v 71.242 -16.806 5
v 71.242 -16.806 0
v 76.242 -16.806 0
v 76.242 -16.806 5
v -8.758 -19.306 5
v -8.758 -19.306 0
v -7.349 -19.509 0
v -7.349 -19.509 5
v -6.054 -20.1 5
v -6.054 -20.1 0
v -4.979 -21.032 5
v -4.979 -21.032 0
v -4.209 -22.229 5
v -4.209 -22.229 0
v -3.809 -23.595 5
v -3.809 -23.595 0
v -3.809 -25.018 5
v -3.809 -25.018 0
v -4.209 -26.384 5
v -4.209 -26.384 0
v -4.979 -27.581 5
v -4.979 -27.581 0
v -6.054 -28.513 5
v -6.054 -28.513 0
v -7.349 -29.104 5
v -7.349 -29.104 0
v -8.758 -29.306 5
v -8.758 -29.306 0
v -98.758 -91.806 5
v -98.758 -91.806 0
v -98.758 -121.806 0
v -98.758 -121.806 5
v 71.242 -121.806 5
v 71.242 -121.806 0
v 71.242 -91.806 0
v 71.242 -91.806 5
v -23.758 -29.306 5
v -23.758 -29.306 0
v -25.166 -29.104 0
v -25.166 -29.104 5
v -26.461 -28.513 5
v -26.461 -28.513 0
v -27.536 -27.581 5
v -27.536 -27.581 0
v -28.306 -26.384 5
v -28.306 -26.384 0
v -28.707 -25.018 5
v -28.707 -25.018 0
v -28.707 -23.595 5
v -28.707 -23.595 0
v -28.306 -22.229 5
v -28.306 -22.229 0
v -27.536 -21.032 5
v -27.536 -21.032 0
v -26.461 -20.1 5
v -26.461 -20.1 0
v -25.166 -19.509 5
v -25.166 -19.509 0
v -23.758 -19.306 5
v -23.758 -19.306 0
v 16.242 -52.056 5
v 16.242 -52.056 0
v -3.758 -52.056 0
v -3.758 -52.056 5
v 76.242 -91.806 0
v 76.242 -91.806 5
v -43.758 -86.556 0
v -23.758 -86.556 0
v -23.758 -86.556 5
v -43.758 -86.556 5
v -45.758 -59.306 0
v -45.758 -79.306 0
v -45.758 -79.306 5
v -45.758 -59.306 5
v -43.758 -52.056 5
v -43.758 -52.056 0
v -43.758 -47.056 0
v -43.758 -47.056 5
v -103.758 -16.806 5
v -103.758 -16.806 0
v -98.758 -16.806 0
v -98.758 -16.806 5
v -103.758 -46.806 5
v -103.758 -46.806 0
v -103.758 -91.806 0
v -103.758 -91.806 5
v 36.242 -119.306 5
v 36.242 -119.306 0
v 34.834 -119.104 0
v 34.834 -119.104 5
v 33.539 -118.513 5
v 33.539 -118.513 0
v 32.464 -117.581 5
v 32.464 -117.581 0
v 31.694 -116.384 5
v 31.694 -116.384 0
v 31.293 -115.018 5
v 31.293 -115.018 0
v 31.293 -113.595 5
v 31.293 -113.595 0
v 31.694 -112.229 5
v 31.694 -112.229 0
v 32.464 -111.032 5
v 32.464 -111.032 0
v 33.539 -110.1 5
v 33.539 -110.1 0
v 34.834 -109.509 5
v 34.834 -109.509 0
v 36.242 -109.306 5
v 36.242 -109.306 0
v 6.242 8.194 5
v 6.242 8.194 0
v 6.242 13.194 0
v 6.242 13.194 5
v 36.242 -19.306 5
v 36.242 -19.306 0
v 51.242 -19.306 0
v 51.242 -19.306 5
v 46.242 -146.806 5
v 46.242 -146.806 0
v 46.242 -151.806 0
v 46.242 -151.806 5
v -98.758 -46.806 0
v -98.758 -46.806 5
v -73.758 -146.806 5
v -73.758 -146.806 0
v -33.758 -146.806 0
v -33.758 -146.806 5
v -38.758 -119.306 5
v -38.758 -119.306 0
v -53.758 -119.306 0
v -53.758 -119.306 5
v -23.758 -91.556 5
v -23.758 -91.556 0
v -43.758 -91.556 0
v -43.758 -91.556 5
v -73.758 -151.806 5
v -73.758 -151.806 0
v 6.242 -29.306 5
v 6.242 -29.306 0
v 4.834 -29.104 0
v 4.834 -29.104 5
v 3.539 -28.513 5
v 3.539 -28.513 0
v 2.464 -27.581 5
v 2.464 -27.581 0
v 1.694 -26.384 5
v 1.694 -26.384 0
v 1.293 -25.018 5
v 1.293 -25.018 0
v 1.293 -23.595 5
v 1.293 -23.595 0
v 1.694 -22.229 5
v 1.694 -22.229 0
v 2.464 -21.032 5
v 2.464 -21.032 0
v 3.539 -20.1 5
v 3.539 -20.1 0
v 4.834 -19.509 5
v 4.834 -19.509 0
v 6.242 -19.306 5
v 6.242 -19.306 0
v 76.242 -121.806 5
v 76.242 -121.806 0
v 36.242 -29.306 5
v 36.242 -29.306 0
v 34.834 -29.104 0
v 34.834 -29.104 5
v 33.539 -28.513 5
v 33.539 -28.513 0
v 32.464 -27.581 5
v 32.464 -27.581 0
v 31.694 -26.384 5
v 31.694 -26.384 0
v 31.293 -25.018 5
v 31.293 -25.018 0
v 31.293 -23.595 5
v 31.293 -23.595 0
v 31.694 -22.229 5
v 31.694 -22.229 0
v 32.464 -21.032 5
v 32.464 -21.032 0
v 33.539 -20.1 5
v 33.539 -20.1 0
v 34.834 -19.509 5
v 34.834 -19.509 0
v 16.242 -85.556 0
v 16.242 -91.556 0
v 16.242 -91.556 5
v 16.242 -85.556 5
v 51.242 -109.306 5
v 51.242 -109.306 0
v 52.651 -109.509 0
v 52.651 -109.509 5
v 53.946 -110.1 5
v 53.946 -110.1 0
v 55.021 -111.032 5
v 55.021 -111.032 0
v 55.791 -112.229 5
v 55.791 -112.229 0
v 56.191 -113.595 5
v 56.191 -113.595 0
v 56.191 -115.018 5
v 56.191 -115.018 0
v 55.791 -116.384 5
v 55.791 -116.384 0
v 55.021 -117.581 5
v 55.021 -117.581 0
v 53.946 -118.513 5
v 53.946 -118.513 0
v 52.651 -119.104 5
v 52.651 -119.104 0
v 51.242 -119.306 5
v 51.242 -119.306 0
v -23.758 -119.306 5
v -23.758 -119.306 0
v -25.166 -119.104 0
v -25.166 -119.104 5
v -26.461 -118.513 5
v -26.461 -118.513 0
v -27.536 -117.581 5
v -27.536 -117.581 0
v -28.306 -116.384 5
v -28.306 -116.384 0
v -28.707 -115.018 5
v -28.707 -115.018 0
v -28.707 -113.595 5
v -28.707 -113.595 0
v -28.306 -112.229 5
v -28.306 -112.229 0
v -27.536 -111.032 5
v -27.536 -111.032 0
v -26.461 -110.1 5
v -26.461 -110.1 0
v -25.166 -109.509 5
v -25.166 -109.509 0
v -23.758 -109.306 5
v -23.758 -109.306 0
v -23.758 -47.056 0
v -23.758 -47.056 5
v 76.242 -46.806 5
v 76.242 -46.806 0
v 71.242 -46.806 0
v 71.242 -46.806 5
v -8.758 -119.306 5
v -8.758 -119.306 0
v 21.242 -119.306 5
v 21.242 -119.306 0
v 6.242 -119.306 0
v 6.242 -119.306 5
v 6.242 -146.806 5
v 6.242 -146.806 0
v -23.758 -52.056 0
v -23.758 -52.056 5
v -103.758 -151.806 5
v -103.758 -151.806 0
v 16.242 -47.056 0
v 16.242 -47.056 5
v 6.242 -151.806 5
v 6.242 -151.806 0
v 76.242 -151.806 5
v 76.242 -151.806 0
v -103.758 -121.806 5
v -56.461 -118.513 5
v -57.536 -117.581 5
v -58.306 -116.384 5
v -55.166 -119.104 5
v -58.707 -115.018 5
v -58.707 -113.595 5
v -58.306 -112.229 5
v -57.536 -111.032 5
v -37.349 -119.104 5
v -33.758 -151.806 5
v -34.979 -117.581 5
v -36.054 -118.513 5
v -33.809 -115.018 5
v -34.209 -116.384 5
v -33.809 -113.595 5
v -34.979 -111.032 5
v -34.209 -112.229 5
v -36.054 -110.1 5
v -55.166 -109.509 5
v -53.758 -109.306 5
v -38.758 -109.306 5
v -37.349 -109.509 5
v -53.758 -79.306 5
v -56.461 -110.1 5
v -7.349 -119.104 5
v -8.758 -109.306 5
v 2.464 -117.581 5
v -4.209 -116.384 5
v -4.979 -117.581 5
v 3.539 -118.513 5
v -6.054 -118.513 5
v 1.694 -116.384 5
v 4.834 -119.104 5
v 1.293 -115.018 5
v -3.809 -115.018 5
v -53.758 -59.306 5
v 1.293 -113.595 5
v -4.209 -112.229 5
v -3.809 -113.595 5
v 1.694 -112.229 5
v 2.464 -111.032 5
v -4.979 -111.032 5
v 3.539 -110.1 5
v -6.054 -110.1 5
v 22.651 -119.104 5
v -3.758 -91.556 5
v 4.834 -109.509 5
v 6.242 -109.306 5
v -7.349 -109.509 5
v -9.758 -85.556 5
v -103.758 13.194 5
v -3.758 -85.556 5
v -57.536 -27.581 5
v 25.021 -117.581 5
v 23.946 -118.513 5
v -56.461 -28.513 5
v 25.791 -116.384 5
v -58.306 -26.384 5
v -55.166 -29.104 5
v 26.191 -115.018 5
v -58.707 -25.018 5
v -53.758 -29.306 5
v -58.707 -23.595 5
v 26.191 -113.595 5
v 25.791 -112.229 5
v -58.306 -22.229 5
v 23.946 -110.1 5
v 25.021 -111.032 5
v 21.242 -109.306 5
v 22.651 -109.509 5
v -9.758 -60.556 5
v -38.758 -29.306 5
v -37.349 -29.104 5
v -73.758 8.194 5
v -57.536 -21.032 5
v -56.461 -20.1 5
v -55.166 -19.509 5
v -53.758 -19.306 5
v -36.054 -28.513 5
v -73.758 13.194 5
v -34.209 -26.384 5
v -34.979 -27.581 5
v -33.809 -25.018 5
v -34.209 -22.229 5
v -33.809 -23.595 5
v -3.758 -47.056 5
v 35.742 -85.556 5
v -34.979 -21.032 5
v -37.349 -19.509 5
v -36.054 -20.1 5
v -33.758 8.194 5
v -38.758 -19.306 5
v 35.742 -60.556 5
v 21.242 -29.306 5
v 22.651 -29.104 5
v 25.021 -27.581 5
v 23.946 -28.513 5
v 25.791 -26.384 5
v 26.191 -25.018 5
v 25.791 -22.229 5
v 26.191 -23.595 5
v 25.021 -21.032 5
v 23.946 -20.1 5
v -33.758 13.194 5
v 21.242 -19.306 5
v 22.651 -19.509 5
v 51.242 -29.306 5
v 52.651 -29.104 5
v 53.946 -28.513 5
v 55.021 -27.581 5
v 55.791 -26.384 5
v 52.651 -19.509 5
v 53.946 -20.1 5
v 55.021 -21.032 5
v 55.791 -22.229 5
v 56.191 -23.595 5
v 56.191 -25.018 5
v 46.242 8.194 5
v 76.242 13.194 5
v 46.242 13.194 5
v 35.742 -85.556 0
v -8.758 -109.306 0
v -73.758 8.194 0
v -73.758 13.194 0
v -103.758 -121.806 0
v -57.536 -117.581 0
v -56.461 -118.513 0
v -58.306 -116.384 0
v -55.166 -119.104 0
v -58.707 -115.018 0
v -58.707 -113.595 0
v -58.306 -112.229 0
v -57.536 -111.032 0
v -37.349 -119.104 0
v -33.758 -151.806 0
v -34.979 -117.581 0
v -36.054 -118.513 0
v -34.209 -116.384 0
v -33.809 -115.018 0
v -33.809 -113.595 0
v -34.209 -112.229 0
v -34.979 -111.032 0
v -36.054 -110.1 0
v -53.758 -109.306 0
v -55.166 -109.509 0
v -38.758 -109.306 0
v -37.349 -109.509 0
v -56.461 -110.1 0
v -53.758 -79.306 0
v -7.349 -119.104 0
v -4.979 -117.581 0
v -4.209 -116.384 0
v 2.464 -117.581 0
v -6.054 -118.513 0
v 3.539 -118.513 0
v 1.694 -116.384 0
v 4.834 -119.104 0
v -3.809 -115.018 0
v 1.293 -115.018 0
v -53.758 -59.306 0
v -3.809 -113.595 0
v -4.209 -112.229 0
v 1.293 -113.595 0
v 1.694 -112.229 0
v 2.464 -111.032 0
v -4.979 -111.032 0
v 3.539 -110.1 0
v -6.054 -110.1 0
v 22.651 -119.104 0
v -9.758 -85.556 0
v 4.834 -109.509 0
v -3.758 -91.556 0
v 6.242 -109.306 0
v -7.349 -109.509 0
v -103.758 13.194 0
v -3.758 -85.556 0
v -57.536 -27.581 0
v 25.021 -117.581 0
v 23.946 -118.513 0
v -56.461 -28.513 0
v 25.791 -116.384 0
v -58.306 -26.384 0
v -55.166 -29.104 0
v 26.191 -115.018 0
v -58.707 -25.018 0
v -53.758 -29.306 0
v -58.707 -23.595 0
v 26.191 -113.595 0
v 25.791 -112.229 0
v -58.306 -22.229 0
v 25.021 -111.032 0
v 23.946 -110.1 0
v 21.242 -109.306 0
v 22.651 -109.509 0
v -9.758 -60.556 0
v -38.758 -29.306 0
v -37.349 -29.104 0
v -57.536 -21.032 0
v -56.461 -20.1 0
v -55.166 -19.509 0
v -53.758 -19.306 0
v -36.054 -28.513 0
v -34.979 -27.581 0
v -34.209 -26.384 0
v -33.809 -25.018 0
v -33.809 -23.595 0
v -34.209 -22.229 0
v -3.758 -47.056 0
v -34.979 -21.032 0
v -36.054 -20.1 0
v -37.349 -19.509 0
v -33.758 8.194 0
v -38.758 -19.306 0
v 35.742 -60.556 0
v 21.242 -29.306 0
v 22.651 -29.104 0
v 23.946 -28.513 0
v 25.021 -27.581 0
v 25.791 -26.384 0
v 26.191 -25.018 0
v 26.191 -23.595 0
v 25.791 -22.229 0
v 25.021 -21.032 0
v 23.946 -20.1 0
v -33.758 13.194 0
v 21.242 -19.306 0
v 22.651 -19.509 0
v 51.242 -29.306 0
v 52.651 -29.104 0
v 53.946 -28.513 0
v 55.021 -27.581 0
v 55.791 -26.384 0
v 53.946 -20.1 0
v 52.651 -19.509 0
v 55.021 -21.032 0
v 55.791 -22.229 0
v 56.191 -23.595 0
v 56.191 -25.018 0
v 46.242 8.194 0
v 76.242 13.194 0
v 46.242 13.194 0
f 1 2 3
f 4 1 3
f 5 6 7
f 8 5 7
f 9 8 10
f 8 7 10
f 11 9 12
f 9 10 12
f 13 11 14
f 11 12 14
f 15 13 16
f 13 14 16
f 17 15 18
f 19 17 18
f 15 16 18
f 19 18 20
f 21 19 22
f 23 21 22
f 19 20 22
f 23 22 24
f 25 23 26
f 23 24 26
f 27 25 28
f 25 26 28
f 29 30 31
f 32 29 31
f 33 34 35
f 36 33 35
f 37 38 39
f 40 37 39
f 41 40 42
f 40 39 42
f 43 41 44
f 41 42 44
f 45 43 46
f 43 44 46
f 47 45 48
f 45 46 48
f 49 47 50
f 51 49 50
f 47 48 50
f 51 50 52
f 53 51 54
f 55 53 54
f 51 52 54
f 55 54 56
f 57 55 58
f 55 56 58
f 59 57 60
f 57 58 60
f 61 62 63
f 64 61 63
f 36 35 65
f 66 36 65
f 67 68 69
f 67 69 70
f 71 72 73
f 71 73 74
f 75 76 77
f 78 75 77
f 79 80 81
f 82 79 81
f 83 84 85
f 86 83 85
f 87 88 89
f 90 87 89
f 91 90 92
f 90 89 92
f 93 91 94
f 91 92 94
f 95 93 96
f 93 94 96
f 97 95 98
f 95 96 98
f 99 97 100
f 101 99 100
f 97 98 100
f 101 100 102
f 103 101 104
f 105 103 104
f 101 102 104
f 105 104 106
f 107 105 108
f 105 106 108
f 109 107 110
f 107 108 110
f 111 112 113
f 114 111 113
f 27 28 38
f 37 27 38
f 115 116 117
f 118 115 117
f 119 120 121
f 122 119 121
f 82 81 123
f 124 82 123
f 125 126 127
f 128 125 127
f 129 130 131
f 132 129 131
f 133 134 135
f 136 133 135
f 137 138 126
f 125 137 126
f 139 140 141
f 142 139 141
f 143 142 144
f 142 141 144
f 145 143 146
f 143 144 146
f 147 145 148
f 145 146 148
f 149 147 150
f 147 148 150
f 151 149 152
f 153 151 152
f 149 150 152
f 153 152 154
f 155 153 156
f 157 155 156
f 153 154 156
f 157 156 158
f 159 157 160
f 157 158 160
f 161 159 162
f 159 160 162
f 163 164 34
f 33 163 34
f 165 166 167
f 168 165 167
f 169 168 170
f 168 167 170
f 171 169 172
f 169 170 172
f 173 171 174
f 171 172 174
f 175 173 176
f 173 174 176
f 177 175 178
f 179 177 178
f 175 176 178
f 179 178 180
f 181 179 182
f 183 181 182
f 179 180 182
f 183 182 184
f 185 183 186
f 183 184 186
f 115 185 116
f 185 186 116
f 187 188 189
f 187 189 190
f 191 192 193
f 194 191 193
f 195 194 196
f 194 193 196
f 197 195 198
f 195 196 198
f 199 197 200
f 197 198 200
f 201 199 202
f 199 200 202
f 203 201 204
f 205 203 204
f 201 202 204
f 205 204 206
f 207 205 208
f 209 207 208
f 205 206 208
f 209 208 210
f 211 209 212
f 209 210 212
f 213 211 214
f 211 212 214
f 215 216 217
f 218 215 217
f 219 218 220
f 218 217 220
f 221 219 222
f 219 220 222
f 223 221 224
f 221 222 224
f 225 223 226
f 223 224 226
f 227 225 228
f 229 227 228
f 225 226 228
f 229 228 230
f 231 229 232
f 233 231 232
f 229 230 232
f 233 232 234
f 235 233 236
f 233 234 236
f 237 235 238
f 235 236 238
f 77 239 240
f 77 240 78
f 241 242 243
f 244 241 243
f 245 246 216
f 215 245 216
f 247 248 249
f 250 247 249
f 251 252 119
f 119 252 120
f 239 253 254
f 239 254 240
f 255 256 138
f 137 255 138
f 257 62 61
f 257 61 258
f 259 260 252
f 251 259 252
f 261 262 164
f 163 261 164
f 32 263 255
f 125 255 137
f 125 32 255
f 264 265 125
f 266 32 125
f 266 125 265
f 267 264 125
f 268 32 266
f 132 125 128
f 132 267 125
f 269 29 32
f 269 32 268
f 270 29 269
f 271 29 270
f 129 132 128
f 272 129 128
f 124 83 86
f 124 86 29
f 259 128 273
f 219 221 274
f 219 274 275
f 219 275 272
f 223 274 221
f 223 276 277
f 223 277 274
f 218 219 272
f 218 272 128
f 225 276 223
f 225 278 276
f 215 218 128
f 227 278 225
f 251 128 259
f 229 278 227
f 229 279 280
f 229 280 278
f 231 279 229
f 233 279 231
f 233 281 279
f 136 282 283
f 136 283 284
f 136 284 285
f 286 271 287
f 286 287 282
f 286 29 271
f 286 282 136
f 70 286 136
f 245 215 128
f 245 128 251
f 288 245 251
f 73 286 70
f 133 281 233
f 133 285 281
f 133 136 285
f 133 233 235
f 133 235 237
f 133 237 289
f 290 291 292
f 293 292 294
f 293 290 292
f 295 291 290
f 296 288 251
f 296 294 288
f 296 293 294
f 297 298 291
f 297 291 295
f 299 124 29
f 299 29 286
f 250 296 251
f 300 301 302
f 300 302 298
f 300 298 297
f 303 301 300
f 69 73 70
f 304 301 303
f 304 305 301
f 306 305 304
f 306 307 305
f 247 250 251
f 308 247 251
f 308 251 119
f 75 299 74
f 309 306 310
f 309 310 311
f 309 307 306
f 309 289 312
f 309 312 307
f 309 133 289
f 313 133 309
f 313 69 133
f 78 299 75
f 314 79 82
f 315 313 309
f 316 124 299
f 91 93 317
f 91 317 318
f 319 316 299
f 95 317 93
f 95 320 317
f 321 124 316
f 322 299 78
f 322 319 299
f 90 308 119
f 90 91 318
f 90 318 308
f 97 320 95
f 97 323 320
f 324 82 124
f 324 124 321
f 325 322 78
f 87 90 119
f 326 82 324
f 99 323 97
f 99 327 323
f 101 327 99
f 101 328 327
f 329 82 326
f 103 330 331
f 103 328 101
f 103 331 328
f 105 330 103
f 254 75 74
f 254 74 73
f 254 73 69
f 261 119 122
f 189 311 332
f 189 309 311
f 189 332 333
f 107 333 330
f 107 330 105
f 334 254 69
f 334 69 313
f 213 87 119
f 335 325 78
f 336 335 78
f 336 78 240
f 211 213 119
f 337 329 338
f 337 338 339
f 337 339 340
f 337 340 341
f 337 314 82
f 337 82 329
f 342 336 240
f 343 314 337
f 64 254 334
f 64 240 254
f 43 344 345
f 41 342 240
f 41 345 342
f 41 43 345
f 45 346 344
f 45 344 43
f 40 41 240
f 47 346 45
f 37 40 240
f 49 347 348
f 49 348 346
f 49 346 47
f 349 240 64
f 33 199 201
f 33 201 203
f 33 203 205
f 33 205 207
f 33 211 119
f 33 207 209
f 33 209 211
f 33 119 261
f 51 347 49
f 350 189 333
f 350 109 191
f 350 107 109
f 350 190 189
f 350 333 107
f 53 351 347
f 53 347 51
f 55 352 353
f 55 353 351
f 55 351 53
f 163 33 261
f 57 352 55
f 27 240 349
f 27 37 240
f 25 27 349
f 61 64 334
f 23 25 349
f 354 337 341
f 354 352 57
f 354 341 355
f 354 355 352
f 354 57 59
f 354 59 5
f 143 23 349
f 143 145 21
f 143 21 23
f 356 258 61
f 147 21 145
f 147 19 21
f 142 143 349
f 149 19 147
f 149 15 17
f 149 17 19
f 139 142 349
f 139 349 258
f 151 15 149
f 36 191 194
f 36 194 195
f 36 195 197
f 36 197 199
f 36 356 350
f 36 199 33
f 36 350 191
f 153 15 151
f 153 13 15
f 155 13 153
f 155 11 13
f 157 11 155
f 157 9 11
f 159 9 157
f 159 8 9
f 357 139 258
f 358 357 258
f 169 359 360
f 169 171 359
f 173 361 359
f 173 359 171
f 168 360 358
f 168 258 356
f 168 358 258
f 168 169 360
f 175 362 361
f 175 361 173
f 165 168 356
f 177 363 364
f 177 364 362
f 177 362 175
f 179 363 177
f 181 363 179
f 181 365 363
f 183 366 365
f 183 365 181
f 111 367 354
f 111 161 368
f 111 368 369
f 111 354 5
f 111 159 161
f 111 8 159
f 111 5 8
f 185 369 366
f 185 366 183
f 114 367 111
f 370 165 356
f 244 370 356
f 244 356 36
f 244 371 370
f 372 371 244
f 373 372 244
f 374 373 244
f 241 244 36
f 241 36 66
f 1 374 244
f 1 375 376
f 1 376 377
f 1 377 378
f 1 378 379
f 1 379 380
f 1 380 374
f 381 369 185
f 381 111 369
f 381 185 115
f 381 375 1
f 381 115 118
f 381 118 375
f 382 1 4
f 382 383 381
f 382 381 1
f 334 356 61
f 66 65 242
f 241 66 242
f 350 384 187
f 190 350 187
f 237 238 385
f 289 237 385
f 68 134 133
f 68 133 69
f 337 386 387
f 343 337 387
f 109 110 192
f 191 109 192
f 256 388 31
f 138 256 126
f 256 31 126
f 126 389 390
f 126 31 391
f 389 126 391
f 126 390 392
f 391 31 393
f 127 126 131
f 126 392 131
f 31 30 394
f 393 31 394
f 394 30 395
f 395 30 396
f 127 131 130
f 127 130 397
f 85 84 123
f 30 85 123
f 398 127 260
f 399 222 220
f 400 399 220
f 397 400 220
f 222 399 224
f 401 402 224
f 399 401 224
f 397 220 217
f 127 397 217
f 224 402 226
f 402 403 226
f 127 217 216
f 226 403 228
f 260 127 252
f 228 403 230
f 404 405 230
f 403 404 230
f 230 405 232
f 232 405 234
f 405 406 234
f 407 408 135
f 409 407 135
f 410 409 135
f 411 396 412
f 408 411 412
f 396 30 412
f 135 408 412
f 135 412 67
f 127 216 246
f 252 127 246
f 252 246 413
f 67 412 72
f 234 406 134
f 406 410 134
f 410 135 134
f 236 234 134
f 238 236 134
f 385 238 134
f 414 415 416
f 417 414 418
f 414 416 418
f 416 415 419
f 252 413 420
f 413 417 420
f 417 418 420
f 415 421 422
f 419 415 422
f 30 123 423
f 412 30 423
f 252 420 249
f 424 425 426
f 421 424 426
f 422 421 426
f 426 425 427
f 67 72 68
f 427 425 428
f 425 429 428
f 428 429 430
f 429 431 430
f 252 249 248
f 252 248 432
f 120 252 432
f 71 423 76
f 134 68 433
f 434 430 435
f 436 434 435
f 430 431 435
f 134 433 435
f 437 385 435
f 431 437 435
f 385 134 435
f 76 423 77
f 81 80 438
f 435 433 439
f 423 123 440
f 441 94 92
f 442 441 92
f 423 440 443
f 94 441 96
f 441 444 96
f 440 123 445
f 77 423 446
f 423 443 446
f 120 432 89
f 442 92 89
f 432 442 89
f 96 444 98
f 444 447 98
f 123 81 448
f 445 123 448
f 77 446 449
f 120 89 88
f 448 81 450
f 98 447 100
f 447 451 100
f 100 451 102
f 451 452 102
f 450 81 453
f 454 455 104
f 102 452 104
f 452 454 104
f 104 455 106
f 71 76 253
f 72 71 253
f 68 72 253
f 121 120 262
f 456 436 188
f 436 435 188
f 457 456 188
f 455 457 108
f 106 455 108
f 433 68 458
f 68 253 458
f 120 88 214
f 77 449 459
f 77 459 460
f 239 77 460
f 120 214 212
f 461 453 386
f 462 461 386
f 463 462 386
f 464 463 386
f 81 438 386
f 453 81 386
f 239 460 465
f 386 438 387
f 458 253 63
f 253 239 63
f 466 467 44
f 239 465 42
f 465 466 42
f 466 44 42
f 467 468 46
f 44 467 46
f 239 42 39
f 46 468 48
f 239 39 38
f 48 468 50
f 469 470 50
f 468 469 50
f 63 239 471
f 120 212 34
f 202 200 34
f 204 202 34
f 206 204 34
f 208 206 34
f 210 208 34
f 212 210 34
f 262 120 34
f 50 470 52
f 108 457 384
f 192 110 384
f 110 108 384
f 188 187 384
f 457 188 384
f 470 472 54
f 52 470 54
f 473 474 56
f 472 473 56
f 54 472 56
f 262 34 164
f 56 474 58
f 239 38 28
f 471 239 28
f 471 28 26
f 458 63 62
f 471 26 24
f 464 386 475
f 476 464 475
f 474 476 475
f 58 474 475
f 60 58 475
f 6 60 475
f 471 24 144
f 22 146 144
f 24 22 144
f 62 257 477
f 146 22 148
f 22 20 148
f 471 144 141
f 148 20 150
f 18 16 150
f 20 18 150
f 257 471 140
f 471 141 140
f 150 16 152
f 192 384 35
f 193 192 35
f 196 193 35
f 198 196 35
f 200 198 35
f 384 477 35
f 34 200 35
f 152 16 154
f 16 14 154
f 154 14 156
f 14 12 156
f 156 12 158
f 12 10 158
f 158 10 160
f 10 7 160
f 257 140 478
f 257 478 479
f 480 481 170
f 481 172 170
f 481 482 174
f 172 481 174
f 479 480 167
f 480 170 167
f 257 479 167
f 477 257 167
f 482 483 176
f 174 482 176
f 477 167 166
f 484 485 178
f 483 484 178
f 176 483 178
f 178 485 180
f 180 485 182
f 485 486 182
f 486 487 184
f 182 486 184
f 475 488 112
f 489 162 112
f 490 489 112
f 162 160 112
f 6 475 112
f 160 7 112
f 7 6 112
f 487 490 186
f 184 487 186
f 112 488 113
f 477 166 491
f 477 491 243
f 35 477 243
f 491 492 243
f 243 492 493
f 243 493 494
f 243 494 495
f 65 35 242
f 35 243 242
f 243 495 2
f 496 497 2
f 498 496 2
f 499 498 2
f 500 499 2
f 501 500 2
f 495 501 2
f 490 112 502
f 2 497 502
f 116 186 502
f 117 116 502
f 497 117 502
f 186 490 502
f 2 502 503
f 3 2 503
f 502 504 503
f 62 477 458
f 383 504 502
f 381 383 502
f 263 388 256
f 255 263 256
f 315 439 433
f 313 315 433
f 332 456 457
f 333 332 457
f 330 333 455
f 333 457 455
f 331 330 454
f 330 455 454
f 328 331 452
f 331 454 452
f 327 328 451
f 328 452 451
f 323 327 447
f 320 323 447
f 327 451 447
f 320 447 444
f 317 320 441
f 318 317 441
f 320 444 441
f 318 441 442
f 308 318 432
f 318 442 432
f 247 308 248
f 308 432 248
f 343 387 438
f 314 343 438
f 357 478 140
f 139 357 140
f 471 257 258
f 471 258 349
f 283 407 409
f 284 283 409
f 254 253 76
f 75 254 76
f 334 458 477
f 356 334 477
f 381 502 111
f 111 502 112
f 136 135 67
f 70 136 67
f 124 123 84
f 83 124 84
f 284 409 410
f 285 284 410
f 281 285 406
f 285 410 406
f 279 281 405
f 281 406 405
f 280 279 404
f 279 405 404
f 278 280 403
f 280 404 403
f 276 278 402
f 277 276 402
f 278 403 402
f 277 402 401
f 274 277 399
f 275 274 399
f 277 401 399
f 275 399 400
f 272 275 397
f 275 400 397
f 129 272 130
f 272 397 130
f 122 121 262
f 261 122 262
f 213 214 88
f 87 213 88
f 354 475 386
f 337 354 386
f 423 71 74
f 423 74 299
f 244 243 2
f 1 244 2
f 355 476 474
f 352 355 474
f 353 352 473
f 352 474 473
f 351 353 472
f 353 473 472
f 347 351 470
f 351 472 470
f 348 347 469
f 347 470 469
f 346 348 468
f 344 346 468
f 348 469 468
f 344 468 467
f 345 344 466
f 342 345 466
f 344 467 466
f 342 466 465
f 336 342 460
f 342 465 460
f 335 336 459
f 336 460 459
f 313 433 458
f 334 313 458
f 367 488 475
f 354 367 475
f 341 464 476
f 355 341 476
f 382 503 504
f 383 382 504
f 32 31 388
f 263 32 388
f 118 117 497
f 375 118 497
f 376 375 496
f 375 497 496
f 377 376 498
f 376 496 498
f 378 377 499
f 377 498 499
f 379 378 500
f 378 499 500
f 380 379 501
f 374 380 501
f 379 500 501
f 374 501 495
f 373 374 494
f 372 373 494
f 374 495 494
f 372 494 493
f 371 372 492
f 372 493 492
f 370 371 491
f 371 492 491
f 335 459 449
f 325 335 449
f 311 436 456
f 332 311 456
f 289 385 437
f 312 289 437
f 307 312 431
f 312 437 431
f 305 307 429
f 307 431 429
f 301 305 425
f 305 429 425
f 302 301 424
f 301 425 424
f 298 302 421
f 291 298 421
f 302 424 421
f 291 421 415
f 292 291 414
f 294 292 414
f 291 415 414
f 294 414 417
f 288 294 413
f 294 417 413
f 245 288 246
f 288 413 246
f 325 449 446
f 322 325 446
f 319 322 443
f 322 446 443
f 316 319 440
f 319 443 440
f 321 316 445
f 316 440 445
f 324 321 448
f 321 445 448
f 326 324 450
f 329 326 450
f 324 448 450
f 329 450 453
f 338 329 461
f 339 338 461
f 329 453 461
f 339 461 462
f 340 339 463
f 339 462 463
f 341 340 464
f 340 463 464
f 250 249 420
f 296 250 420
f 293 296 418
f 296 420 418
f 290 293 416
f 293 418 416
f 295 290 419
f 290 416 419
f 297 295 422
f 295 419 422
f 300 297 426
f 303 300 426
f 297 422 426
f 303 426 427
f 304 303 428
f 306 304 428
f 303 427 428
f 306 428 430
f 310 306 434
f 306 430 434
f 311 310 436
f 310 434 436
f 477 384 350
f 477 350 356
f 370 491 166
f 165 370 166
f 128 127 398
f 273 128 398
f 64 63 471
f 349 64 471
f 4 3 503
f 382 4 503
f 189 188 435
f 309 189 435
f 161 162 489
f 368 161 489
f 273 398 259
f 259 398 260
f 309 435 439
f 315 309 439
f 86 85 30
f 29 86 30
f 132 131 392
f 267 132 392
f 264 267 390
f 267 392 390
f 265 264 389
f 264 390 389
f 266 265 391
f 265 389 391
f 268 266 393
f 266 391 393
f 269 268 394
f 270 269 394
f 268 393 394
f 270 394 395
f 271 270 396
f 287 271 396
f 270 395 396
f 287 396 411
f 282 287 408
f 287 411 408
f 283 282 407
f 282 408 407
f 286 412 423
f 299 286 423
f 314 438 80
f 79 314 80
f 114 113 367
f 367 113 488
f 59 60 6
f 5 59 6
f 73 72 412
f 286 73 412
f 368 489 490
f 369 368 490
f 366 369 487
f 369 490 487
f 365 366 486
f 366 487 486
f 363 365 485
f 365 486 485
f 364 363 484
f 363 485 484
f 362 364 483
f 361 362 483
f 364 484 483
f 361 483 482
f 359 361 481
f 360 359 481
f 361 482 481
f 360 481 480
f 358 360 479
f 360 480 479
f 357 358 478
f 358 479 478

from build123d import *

# Parameters (mm, degrees)
BOSS_EXTRUDE1_DEPTH = 5
SKETCH2_W           = 20
SKETCH2_H           = 5
SKETCH2_H_2         = 6
SKETCH2_W_2         = 8
SKETCH2_H_3         = 20
SKETCH2_W_3         = 11.5
SKETCH2_H_4         = 25
SKETCH2_W_4         = 3
CUT_EXTRUDE1_DEPTH  = 10


with BuildPart() as part:
    # Sketch1 → Boss-Extrude1 (new body)
    with BuildSketch(Plane.XY):
        Polygon((6.242353031, 8.193551366), (6.242353031, 13.193551366), (-33.757646969, 13.193551366), (-33.757646969, 8.193551366), (-73.757646969, 8.193551366), (-73.757646969, 13.193551366), (-103.757646969, 13.193551366), (-103.757646969, -16.806448634), (-98.757646969, -16.806448634), (-98.757646969, -46.806448634), (-103.757646969, -46.806448634), (-103.757646969, -91.806448634), (-98.757646969, -91.806448634), (-98.757646969, -121.806448634), (-103.757646969, -121.806448634), (-103.757646969, -151.806448634), (-73.757646969, -151.806448634), (-73.757646969, -146.806448634), (-33.757646969, -146.806448634), (-33.757646969, -151.806448634), (6.242353031, -151.806448634), (6.242353031, -146.806448634), (46.242353031, -146.806448634), (46.242353031, -151.806448634), (76.242353031, -151.806448634), (76.242353031, -121.806448634), (71.242353031, -121.806448634), (71.242353031, -91.806448634), (76.242353031, -91.806448634), (76.242353031, -46.806448634), (71.242353031, -46.806448634), (71.242353031, -16.806448634), (76.242353031, -16.806448634), (76.242353031, 13.193551366), (46.242353031, 13.193551366), (46.242353031, 8.193551366), align=None)
        with BuildLine():
            ThreePointArc((21.242353031, -19.306448634), (26.242353031, -24.306448634), (21.242353031, -29.306448634))
            Line((21.242353031, -29.306448634), (6.242353031, -29.306448634))
            ThreePointArc((6.242353031, -29.306448634), (1.242353031, -24.306448634), (6.242353031, -19.306448634))
            Line((6.242353031, -19.306448634), (21.242353031, -19.306448634))
        make_face(mode=Mode.SUBTRACT)
        with BuildLine():
            Line((21.242353031, -119.306448634), (6.242353031, -119.306448634))
            ThreePointArc((6.242353031, -119.306448634), (1.242353031, -114.306448634), (6.242353031, -109.306448634))
            Line((6.242353031, -109.306448634), (21.242353031, -109.306448634))
            ThreePointArc((21.242353031, -109.306448634), (26.242353031, -114.306448634), (21.242353031, -119.306448634))
        make_face(mode=Mode.SUBTRACT)
        with BuildLine():
            Line((36.242353031, -19.306448634), (51.242353031, -19.306448634))
            ThreePointArc((51.242353031, -19.306448634), (56.242353031, -24.306448634), (51.242353031, -29.306448634))
            Line((51.242353031, -29.306448634), (36.242353031, -29.306448634))
            ThreePointArc((36.242353031, -29.306448634), (31.242353031, -24.306448634), (36.242353031, -19.306448634))
        make_face(mode=Mode.SUBTRACT)
        with BuildLine():
            ThreePointArc((51.242353031, -109.306448634), (56.242353031, -114.306448634), (51.242353031, -119.306448634))
            Line((51.242353031, -119.306448634), (36.242353031, -119.306448634))
            ThreePointArc((36.242353031, -119.306448634), (31.242353031, -114.306448634), (36.242353031, -109.306448634))
            Line((36.242353031, -109.306448634), (51.242353031, -109.306448634))
        make_face(mode=Mode.SUBTRACT)
        with BuildLine():
            Line((-53.757646969, -109.306448634), (-38.757646969, -109.306448634))
            ThreePointArc((-38.757646969, -109.306448634), (-33.757646969, -114.306448634), (-38.757646969, -119.306448634))
            Line((-38.757646969, -119.306448634), (-53.757646969, -119.306448634))
            ThreePointArc((-53.757646969, -119.306448634), (-58.757646969, -114.306448634), (-53.757646969, -109.306448634))
        make_face(mode=Mode.SUBTRACT)
        with BuildLine():
            Line((-8.757646969, -119.306448634), (-23.757646969, -119.306448634))
            ThreePointArc((-23.757646969, -119.306448634), (-28.757646969, -114.306448634), (-23.757646969, -109.306448634))
            Line((-23.757646969, -109.306448634), (-8.757646969, -109.306448634))
            ThreePointArc((-8.757646969, -109.306448634), (-3.757646969, -114.306448634), (-8.757646969, -119.306448634))
        make_face(mode=Mode.SUBTRACT)
        with BuildLine():
            Line((-53.757646969, -19.306448634), (-38.757646969, -19.306448634))
            ThreePointArc((-38.757646969, -19.306448634), (-33.757646969, -24.306448634), (-38.757646969, -29.306448634))
            Line((-38.757646969, -29.306448634), (-53.757646969, -29.306448634))
            ThreePointArc((-53.757646969, -29.306448634), (-58.757646969, -24.306448634), (-53.757646969, -19.306448634))
        make_face(mode=Mode.SUBTRACT)
        with BuildLine():
            Line((-8.757646969, -29.306448634), (-23.757646969, -29.306448634))
            ThreePointArc((-23.757646969, -29.306448634), (-28.757646969, -24.306448634), (-23.757646969, -19.306448634))
            Line((-23.757646969, -19.306448634), (-8.757646969, -19.306448634))
            ThreePointArc((-8.757646969, -19.306448634), (-3.757646969, -24.306448634), (-8.757646969, -29.306448634))
        make_face(mode=Mode.SUBTRACT)
    extrude(amount=BOSS_EXTRUDE1_DEPTH)

    # Sketch2 → Cut-Extrude1 (cut)
    with BuildSketch(Plane(origin=(0, 0, 0), x_dir=(-1, 0, 0), z_dir=(0, 0, -1))):
        with Locations((-6.242353031, -49.556448634)):
            Rectangle(SKETCH2_W, SKETCH2_H)
        with Locations((33.757646969, -49.556448634)):
            Rectangle(SKETCH2_W, SKETCH2_H)
        with Locations((33.757646969, -89.056448634)):
            Rectangle(SKETCH2_W, SKETCH2_H)
        Polygon((-16.242353031, -85.556448634), (3.757646969, -85.556448634), (9.757646969, -85.556448634), (9.757646969, -60.556448634), (-21.242353031, -60.556448634), (-21.242353031, -85.556448634), align=None)
        with Locations((-6.242353031, -88.556448634)):
            Rectangle(SKETCH2_W, SKETCH2_H_2)
        with Locations((49.757646969, -69.306448634)):
            Rectangle(SKETCH2_W_2, SKETCH2_H_3)
        with Locations((-29.992353031, -73.056448634)):
            Rectangle(SKETCH2_W_3, SKETCH2_H_4)
        with Locations((-22.742353031, -73.056448634)):
            Rectangle(SKETCH2_W_4, SKETCH2_H_4)
    extrude(amount=-CUT_EXTRUDE1_DEPTH, mode=Mode.SUBTRACT)


solid = part.part
